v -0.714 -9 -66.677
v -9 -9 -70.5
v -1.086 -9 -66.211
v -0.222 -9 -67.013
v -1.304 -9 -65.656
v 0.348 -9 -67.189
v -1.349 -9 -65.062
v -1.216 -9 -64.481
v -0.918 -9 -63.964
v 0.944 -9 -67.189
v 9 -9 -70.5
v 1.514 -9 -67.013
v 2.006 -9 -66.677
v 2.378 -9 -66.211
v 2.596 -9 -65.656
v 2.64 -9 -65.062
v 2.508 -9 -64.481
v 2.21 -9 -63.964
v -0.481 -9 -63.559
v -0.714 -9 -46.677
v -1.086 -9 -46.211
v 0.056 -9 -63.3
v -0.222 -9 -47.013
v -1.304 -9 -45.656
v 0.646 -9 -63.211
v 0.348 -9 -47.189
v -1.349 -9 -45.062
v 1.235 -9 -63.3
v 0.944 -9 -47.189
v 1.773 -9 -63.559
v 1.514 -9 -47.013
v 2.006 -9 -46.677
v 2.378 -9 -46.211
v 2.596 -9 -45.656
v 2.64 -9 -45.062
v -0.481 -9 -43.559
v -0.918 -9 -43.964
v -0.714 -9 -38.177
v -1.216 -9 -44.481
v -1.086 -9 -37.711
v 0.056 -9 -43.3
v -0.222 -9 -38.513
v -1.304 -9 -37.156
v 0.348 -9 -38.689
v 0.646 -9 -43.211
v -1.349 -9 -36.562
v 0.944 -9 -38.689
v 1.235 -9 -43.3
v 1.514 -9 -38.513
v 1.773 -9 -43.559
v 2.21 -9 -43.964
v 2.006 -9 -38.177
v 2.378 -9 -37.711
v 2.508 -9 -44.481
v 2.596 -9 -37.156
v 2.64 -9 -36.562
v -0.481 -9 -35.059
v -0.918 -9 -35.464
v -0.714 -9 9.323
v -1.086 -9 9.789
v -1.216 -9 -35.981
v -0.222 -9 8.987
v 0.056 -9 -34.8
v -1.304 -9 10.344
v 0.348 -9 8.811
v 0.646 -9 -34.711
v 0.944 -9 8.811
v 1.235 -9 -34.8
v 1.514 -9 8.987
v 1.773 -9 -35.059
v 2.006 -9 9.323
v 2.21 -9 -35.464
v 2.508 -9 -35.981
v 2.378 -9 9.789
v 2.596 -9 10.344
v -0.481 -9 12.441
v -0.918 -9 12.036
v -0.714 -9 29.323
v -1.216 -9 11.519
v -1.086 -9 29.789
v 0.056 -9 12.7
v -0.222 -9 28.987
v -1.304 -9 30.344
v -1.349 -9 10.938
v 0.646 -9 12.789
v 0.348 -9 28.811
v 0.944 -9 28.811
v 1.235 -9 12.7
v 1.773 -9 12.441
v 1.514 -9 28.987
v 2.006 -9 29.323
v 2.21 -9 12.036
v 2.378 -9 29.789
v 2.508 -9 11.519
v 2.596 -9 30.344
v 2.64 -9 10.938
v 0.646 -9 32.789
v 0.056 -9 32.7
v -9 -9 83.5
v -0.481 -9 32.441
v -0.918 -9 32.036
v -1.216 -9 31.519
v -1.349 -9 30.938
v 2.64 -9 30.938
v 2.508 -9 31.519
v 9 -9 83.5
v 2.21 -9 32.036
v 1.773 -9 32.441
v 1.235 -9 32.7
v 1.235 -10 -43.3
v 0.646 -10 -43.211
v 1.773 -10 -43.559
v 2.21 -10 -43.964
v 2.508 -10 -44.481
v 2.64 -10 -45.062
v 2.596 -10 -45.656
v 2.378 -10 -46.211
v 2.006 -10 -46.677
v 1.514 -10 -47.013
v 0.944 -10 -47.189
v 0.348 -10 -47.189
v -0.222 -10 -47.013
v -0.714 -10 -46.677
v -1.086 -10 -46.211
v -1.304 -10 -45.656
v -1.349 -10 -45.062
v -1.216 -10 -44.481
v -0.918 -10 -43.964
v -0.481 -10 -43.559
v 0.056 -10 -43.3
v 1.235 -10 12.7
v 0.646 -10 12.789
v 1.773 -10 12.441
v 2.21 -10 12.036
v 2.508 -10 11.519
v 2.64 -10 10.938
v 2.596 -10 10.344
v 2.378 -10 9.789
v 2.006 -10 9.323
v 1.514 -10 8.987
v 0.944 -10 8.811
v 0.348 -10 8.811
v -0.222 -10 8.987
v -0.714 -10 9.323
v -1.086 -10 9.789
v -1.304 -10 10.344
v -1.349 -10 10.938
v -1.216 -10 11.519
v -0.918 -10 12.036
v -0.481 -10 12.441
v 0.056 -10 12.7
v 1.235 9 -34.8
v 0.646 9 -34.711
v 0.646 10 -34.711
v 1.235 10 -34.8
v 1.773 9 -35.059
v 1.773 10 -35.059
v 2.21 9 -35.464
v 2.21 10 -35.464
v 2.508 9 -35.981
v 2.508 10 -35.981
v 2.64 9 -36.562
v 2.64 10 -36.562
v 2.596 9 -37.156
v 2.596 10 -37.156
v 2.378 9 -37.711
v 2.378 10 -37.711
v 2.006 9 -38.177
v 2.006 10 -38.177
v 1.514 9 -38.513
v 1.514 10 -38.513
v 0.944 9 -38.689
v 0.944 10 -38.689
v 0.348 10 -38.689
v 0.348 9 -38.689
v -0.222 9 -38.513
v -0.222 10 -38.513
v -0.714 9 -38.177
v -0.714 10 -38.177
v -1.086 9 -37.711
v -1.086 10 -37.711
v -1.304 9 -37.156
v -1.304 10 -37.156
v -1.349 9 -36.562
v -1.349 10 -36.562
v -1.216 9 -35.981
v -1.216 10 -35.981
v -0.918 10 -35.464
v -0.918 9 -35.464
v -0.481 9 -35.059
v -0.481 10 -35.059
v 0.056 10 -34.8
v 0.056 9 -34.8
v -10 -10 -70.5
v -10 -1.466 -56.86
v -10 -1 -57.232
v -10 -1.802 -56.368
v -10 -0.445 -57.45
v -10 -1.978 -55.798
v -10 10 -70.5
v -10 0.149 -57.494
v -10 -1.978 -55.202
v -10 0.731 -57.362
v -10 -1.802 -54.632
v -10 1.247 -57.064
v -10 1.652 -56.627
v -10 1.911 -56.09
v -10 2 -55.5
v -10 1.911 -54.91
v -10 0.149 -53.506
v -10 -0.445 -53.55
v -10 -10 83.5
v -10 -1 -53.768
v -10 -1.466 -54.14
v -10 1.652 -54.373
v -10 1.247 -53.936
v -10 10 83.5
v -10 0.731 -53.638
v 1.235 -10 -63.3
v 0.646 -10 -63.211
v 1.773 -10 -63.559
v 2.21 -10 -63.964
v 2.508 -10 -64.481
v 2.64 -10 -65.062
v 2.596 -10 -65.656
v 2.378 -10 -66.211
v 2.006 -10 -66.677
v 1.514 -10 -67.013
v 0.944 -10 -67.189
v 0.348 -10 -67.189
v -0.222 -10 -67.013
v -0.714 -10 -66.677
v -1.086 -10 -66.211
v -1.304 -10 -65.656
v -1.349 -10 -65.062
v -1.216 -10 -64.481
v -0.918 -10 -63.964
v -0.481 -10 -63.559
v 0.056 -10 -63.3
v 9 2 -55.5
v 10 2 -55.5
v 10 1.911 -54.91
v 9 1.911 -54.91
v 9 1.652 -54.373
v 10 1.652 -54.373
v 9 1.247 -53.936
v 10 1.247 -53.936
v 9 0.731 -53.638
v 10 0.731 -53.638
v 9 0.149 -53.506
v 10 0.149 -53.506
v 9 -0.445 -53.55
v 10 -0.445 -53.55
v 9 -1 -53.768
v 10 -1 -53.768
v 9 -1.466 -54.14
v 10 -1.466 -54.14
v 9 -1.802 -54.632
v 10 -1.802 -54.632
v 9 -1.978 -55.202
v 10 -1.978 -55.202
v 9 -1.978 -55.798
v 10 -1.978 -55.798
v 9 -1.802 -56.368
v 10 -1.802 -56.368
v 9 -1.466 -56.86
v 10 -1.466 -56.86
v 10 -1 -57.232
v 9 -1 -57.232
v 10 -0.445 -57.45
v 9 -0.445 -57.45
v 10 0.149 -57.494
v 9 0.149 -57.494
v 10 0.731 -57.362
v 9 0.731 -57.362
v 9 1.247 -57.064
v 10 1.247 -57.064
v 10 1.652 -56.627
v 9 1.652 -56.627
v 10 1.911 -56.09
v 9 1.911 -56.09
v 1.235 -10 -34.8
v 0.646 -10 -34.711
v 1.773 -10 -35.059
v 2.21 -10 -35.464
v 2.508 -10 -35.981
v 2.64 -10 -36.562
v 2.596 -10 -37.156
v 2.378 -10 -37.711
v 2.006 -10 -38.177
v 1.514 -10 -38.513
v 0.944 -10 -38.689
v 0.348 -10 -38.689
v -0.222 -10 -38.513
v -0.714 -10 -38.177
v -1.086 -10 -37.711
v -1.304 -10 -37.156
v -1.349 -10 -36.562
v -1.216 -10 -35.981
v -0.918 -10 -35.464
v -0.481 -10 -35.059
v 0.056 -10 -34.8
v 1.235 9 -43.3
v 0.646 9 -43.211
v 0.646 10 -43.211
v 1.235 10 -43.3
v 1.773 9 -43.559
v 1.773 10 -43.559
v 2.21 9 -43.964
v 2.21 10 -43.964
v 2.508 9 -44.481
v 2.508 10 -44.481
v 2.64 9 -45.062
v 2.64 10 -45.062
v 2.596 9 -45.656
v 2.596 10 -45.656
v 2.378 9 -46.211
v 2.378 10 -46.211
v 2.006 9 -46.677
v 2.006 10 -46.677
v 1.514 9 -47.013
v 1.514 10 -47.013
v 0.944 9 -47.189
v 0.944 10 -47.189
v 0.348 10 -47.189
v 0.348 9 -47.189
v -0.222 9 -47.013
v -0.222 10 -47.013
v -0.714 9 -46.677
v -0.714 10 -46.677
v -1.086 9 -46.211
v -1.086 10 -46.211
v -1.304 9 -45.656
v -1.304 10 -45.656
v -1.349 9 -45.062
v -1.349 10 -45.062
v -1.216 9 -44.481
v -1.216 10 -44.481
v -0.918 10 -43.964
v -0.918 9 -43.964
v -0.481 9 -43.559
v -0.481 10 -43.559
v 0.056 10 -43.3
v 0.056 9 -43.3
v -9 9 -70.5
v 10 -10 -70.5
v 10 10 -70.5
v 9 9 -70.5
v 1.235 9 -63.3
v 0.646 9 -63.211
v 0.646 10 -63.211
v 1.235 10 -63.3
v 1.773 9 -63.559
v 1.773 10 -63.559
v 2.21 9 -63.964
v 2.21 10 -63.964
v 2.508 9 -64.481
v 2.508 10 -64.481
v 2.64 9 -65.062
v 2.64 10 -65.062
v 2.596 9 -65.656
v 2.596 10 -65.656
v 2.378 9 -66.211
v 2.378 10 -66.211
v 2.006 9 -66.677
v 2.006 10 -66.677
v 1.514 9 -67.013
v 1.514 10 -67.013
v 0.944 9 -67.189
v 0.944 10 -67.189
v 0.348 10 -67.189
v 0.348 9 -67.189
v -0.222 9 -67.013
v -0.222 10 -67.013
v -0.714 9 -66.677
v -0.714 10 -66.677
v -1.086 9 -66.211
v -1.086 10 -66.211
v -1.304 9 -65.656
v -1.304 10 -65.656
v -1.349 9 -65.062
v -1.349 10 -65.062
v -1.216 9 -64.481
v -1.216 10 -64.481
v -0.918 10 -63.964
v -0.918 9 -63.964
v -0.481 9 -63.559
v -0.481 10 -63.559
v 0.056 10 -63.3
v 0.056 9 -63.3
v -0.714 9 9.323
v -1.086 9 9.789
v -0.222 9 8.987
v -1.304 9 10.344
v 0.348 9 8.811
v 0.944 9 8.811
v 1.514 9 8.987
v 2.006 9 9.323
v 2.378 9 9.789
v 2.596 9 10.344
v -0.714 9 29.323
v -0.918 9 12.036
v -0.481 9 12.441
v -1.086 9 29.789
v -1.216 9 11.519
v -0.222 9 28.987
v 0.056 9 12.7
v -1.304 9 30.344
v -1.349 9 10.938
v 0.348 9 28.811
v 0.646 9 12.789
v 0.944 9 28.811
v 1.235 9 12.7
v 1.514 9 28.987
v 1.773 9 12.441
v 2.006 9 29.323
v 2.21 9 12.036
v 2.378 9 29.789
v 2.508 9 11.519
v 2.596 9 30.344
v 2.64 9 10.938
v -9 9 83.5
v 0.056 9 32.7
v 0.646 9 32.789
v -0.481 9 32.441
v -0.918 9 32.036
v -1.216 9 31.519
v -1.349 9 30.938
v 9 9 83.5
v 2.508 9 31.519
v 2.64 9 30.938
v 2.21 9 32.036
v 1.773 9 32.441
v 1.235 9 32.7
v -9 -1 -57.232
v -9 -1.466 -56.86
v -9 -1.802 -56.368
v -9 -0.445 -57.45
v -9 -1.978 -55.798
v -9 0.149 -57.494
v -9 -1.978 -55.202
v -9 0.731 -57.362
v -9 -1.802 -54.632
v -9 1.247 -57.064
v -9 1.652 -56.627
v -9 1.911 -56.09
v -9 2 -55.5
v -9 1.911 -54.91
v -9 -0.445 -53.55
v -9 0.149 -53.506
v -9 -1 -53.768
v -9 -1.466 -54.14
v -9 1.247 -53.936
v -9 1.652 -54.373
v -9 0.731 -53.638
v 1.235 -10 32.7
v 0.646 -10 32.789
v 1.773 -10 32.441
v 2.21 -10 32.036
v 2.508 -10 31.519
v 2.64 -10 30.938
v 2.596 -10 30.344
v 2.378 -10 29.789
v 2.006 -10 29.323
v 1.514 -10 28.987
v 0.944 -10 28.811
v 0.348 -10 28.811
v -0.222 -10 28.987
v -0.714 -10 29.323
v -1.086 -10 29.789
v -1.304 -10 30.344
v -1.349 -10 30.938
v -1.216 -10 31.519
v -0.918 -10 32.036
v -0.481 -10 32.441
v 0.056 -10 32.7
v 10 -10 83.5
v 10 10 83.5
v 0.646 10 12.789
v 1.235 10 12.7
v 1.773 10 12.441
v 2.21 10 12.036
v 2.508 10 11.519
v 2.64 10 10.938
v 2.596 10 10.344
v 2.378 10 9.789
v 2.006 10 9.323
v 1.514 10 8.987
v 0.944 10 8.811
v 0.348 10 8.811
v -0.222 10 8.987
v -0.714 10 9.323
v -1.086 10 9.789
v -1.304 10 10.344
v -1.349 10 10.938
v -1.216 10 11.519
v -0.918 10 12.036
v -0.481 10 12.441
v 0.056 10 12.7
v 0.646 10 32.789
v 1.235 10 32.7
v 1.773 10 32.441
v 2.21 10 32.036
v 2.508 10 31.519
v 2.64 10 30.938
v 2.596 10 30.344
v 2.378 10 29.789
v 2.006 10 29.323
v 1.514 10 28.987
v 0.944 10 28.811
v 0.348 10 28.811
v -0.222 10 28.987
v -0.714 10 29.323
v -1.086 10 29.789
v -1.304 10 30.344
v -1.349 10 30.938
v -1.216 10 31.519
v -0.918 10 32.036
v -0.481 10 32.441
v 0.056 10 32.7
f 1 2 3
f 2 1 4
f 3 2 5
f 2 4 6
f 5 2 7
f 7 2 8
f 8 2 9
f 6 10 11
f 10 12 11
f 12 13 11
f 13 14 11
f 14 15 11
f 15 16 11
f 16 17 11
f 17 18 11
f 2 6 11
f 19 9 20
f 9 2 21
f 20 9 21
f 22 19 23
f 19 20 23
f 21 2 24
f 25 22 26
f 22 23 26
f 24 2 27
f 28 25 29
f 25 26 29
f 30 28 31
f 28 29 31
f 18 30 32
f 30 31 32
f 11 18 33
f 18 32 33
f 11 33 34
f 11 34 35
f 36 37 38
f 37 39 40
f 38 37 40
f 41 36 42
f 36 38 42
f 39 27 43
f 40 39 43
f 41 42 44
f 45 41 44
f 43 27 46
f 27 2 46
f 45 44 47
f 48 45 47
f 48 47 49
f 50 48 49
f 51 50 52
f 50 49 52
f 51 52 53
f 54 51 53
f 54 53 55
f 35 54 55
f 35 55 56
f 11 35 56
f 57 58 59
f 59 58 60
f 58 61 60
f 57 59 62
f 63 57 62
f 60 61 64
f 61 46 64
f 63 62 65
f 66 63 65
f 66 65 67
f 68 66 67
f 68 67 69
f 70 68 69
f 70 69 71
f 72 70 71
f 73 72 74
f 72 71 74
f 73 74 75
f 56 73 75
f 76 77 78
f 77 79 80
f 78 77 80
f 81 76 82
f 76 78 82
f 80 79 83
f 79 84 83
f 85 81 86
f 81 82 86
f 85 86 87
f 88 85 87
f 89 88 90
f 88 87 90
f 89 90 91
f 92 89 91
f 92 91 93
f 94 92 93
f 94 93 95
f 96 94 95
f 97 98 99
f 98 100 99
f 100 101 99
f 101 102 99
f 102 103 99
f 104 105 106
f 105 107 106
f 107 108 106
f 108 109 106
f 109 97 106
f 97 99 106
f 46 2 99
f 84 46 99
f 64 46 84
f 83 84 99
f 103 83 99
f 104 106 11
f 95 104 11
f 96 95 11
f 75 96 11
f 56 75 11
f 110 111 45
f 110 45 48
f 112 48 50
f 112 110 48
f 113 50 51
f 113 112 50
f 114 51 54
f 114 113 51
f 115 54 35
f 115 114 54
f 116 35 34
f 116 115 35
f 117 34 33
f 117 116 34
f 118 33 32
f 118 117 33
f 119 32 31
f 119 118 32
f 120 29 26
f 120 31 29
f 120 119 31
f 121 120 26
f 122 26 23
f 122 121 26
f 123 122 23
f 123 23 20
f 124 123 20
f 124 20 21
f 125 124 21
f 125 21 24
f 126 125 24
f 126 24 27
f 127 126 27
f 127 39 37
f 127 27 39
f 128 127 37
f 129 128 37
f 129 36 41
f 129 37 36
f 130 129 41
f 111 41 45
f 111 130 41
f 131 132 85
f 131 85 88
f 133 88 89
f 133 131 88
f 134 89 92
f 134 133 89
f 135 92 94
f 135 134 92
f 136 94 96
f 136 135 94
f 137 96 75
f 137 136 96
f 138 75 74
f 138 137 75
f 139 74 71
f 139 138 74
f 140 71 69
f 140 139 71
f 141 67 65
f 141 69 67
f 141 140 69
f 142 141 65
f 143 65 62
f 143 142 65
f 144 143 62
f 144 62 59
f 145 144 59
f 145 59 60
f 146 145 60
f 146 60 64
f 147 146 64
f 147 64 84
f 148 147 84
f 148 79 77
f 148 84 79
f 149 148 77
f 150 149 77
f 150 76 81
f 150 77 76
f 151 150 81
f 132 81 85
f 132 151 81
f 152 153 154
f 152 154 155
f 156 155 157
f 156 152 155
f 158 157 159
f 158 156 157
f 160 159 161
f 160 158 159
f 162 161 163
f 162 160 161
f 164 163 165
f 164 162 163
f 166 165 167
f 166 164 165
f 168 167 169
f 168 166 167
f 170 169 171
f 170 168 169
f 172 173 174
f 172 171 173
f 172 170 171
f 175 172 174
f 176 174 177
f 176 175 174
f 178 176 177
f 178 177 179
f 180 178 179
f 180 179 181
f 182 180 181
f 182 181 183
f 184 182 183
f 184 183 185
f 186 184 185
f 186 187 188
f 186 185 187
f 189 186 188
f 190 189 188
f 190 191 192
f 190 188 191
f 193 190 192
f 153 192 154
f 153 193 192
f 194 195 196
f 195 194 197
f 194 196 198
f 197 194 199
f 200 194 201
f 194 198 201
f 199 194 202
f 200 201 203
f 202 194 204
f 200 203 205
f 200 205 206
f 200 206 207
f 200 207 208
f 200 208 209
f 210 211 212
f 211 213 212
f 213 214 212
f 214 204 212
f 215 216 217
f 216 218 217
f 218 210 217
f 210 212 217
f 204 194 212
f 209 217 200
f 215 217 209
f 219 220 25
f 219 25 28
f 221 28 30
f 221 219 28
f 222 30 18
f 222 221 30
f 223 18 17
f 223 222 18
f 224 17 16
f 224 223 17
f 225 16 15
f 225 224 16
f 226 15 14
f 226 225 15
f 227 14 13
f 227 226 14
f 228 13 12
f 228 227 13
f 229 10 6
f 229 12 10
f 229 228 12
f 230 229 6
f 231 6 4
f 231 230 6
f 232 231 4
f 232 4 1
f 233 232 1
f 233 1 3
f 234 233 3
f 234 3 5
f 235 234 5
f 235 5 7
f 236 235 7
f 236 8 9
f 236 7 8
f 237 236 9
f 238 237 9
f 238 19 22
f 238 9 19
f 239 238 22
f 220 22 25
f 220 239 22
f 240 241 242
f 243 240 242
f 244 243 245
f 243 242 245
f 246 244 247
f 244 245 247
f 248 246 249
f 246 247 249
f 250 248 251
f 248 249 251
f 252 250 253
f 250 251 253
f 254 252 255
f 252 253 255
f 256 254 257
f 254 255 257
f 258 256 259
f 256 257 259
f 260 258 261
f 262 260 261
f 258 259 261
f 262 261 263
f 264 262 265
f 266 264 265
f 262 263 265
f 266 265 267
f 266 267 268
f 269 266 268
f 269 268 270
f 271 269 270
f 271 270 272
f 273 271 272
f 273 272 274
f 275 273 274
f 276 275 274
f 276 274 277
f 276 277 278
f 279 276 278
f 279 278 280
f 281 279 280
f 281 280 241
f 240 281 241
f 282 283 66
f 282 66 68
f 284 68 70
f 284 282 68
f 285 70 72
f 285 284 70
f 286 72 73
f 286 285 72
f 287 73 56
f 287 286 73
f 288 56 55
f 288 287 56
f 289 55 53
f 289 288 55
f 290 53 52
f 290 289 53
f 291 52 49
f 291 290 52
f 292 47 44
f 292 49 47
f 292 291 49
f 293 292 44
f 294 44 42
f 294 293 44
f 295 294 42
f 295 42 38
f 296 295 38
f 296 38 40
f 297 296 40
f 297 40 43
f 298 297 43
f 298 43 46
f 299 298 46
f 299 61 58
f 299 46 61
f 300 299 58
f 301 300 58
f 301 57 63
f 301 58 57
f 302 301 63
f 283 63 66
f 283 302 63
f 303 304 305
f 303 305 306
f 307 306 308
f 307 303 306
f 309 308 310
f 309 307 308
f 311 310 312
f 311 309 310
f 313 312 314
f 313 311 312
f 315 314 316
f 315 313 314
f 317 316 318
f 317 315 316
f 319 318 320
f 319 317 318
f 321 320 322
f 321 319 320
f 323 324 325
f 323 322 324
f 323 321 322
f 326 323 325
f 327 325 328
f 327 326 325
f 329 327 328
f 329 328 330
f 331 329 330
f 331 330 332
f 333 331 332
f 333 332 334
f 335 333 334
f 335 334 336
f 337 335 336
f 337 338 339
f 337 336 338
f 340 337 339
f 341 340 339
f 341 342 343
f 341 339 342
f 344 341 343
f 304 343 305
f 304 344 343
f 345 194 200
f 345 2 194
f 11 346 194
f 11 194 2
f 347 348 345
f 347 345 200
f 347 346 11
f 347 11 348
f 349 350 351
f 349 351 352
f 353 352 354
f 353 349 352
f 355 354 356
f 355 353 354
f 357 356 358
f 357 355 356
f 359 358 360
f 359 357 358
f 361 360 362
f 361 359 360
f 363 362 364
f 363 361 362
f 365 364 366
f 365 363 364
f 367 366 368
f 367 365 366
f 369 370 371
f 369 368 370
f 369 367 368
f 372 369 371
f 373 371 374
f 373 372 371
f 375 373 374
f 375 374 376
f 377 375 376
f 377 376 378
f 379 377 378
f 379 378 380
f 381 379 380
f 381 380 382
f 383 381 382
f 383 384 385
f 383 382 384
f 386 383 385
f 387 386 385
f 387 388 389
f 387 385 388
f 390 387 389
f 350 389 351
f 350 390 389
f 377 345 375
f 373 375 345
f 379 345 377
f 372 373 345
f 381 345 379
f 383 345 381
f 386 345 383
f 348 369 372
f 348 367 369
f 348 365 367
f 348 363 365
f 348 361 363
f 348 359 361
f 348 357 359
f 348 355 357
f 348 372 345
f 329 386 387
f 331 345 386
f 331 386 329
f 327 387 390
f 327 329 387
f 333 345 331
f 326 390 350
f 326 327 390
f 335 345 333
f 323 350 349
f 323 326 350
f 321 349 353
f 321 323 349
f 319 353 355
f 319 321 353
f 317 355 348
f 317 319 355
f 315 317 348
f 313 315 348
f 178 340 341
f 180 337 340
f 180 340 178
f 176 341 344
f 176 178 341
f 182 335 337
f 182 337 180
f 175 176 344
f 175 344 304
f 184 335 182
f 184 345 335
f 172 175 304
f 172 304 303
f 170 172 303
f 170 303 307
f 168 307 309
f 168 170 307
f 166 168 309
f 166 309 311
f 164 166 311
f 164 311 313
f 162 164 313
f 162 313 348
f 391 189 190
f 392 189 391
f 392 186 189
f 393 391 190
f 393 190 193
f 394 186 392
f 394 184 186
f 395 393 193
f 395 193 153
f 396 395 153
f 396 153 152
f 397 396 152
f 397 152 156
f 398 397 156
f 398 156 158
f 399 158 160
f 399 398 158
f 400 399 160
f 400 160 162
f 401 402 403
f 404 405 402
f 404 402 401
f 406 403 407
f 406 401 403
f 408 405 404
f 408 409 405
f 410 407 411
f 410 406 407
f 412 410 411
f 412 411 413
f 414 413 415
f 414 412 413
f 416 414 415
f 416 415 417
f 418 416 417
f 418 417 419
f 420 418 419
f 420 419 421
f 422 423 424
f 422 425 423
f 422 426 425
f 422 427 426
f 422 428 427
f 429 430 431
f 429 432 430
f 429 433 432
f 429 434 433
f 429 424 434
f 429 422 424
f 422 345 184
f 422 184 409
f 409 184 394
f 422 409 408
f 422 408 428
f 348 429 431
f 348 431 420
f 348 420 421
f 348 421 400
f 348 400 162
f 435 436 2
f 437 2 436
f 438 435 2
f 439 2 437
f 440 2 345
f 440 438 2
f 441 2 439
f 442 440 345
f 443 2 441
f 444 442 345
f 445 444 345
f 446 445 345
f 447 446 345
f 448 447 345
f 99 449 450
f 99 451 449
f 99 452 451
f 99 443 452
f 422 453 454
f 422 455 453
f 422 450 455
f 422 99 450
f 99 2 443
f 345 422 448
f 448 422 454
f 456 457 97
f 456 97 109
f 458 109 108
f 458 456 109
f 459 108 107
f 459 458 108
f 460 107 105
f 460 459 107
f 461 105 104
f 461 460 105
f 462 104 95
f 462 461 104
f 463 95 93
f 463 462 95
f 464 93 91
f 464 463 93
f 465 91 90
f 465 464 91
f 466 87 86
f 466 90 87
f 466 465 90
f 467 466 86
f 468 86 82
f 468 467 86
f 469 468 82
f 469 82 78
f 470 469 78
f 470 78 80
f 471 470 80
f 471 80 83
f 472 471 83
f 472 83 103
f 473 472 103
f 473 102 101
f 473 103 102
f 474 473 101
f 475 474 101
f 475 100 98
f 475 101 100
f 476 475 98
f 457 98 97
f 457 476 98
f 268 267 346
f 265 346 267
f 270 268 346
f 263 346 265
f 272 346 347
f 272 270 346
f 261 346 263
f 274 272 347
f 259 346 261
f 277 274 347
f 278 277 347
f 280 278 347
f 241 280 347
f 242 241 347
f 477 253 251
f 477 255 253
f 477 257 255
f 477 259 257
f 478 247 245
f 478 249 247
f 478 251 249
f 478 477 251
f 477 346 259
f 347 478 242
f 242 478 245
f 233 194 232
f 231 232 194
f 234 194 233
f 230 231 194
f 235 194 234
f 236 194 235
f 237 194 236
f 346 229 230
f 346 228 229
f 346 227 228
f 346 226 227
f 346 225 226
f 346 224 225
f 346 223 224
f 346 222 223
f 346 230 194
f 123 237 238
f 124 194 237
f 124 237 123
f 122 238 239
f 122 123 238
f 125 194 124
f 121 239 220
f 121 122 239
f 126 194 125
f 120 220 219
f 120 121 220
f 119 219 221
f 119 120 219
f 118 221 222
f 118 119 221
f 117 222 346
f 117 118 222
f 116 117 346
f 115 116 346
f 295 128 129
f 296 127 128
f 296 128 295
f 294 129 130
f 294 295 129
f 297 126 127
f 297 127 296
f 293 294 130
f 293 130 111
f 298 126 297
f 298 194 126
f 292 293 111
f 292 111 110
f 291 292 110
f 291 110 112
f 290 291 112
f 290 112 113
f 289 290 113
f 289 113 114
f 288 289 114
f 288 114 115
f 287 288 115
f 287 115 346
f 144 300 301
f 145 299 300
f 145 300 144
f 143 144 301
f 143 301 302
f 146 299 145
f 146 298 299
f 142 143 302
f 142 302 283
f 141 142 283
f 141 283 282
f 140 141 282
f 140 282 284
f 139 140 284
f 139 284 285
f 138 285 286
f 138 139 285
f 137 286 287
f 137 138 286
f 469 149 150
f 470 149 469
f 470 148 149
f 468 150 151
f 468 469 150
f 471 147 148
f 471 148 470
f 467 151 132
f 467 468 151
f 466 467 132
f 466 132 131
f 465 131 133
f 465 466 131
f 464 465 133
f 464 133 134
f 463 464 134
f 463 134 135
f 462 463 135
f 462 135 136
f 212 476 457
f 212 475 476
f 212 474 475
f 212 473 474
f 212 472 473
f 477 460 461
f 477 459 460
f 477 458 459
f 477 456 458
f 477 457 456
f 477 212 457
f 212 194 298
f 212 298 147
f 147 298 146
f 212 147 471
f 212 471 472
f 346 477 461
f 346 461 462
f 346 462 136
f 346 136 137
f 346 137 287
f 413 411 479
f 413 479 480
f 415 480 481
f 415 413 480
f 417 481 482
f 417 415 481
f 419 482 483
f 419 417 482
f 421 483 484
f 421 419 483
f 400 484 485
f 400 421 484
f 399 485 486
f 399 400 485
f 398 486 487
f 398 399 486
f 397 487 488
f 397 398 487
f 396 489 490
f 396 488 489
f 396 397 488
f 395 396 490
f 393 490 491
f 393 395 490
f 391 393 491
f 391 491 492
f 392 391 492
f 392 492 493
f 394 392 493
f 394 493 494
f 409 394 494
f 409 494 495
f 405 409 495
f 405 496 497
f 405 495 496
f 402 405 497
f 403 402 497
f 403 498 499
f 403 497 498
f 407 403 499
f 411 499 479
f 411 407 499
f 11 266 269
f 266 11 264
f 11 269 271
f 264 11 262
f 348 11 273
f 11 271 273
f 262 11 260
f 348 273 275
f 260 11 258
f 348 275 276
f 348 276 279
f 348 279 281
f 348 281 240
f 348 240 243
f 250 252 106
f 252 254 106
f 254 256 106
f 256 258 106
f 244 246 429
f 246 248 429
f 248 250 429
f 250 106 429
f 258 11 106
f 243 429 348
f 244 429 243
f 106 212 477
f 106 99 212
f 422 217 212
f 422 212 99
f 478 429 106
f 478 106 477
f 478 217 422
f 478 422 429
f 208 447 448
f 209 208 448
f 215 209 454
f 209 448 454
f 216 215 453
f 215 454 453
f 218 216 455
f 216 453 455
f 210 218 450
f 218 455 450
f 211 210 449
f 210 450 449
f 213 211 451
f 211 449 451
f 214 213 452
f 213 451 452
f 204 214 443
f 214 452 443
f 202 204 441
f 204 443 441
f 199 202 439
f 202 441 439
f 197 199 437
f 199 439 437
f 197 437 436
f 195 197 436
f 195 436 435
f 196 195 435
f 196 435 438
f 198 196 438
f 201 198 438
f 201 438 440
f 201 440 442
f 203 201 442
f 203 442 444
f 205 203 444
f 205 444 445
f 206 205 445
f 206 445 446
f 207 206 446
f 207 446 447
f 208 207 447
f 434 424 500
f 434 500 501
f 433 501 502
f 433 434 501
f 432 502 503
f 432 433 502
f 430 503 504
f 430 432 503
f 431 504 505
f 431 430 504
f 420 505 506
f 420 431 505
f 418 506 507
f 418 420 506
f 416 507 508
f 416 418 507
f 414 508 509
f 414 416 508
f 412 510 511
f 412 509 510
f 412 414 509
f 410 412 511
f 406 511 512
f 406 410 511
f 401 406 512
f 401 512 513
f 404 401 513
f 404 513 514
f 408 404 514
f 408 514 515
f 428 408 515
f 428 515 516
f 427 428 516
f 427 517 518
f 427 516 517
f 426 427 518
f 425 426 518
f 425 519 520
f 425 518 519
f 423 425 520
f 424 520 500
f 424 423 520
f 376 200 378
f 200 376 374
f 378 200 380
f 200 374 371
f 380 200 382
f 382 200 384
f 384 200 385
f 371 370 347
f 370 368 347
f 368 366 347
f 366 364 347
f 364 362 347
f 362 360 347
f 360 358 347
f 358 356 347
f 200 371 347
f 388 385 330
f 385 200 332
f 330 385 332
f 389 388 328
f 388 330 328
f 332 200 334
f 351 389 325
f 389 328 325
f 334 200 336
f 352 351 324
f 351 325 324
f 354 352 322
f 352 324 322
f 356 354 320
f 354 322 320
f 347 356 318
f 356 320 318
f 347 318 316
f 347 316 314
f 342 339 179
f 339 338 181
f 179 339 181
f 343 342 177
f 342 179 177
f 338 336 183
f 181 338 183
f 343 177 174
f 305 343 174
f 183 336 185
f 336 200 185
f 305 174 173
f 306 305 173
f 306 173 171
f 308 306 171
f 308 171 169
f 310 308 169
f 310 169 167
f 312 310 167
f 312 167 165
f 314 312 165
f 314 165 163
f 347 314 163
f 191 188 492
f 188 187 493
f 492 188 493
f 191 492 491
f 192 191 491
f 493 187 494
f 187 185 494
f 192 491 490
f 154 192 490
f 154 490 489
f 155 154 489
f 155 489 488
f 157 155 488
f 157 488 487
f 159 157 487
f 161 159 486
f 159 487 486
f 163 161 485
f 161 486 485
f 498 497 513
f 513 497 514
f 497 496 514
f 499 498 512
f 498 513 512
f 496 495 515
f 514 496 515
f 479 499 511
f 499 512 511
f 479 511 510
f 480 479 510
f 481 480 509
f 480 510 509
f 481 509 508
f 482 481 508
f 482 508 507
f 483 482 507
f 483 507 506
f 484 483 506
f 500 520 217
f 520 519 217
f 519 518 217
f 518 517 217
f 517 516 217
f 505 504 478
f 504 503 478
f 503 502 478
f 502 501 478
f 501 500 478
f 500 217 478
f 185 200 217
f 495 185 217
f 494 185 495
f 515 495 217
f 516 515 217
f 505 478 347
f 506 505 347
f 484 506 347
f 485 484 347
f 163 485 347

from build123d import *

# Parameters (mm, degrees)
SKETCH_1_W               = 20
SKETCH_1_H               = 20
SKETCH_1_W_2             = 18
SKETCH_1_H_2             = 18
EXTRUDE_1_DEPTH          = 83.5
CUT_EXTRUDE_2_DEPTH      = 85.689137438
CUT_EXTRUDE_2_DEPTH_BACK = 85.689137438
SKETCH_3_R               = 2
SKETCH_5_W               = 13
SKETCH_5_H               = 20
CUT_EXTRUDE_3_DEPTH      = 87.442177205
SKETCH_7_R               = 2
CUT_EXTRUDE_4_DEPTH      = 87.442177205


with BuildPart() as part:
    # 草图1 → 凸台-拉伸1 (new, symmetric)
    with BuildSketch(Plane.XY):
        Rectangle(SKETCH_1_W, SKETCH_1_H)
        Rectangle(SKETCH_1_W_2, SKETCH_1_H_2, mode=Mode.SUBTRACT)
    extrude(amount=EXTRUDE_1_DEPTH, both=True)

    # 草图3 → 切除-拉伸2 (cut, two sides: drawn at the far end of the back side and taken through both)
    with BuildSketch(Plane(origin=(0, 0, 0), x_dir=(1, 0, 0), z_dir=(0, 1, 0)).offset(-CUT_EXTRUDE_2_DEPTH_BACK)):
        with Locations(Location((0.645896247, -30.788728887, 0), (0, 0, 270))):
            Circle(SKETCH_3_R)
        with Locations(Location((0.645896247, -10.788728887, 0), (0, 0, 270))):
            Circle(SKETCH_3_R)
        with Locations(Location((0.645896247, 36.711271113, 0), (0, 0, 270))):
            Circle(SKETCH_3_R)
        with Locations(Location((0.645896247, 45.211271113, 0), (0, 0, 270))):
            Circle(SKETCH_3_R)
        with Locations(Location((0.645896247, 65.211271113, 0), (0, 0, 270))):
            Circle(SKETCH_3_R)
    extrude(amount=CUT_EXTRUDE_2_DEPTH + CUT_EXTRUDE_2_DEPTH_BACK, mode=Mode.SUBTRACT)

    # 草图5 → 切除-拉伸3 (cut, through all)
    with BuildSketch(Plane(origin=(10, 0, 0), x_dir=(0, 0, -1), z_dir=(1, 0, 0))):
        with Locations((77, 0)):
            Rectangle(SKETCH_5_W, SKETCH_5_H)
    extrude(amount=-CUT_EXTRUDE_3_DEPTH, mode=Mode.SUBTRACT)

    # 草图7 → 切除-拉伸4 (cut, through all)
    with BuildSketch(Plane(origin=(10, 0, 0), x_dir=(0, 0, -1), z_dir=(1, 0, 0))):
        with Locations(Location((55.5, 0, 0), (0, 0, 90))):
            Circle(SKETCH_7_R)
    extrude(amount=-CUT_EXTRUDE_4_DEPTH, mode=Mode.SUBTRACT)


solid = part.part
